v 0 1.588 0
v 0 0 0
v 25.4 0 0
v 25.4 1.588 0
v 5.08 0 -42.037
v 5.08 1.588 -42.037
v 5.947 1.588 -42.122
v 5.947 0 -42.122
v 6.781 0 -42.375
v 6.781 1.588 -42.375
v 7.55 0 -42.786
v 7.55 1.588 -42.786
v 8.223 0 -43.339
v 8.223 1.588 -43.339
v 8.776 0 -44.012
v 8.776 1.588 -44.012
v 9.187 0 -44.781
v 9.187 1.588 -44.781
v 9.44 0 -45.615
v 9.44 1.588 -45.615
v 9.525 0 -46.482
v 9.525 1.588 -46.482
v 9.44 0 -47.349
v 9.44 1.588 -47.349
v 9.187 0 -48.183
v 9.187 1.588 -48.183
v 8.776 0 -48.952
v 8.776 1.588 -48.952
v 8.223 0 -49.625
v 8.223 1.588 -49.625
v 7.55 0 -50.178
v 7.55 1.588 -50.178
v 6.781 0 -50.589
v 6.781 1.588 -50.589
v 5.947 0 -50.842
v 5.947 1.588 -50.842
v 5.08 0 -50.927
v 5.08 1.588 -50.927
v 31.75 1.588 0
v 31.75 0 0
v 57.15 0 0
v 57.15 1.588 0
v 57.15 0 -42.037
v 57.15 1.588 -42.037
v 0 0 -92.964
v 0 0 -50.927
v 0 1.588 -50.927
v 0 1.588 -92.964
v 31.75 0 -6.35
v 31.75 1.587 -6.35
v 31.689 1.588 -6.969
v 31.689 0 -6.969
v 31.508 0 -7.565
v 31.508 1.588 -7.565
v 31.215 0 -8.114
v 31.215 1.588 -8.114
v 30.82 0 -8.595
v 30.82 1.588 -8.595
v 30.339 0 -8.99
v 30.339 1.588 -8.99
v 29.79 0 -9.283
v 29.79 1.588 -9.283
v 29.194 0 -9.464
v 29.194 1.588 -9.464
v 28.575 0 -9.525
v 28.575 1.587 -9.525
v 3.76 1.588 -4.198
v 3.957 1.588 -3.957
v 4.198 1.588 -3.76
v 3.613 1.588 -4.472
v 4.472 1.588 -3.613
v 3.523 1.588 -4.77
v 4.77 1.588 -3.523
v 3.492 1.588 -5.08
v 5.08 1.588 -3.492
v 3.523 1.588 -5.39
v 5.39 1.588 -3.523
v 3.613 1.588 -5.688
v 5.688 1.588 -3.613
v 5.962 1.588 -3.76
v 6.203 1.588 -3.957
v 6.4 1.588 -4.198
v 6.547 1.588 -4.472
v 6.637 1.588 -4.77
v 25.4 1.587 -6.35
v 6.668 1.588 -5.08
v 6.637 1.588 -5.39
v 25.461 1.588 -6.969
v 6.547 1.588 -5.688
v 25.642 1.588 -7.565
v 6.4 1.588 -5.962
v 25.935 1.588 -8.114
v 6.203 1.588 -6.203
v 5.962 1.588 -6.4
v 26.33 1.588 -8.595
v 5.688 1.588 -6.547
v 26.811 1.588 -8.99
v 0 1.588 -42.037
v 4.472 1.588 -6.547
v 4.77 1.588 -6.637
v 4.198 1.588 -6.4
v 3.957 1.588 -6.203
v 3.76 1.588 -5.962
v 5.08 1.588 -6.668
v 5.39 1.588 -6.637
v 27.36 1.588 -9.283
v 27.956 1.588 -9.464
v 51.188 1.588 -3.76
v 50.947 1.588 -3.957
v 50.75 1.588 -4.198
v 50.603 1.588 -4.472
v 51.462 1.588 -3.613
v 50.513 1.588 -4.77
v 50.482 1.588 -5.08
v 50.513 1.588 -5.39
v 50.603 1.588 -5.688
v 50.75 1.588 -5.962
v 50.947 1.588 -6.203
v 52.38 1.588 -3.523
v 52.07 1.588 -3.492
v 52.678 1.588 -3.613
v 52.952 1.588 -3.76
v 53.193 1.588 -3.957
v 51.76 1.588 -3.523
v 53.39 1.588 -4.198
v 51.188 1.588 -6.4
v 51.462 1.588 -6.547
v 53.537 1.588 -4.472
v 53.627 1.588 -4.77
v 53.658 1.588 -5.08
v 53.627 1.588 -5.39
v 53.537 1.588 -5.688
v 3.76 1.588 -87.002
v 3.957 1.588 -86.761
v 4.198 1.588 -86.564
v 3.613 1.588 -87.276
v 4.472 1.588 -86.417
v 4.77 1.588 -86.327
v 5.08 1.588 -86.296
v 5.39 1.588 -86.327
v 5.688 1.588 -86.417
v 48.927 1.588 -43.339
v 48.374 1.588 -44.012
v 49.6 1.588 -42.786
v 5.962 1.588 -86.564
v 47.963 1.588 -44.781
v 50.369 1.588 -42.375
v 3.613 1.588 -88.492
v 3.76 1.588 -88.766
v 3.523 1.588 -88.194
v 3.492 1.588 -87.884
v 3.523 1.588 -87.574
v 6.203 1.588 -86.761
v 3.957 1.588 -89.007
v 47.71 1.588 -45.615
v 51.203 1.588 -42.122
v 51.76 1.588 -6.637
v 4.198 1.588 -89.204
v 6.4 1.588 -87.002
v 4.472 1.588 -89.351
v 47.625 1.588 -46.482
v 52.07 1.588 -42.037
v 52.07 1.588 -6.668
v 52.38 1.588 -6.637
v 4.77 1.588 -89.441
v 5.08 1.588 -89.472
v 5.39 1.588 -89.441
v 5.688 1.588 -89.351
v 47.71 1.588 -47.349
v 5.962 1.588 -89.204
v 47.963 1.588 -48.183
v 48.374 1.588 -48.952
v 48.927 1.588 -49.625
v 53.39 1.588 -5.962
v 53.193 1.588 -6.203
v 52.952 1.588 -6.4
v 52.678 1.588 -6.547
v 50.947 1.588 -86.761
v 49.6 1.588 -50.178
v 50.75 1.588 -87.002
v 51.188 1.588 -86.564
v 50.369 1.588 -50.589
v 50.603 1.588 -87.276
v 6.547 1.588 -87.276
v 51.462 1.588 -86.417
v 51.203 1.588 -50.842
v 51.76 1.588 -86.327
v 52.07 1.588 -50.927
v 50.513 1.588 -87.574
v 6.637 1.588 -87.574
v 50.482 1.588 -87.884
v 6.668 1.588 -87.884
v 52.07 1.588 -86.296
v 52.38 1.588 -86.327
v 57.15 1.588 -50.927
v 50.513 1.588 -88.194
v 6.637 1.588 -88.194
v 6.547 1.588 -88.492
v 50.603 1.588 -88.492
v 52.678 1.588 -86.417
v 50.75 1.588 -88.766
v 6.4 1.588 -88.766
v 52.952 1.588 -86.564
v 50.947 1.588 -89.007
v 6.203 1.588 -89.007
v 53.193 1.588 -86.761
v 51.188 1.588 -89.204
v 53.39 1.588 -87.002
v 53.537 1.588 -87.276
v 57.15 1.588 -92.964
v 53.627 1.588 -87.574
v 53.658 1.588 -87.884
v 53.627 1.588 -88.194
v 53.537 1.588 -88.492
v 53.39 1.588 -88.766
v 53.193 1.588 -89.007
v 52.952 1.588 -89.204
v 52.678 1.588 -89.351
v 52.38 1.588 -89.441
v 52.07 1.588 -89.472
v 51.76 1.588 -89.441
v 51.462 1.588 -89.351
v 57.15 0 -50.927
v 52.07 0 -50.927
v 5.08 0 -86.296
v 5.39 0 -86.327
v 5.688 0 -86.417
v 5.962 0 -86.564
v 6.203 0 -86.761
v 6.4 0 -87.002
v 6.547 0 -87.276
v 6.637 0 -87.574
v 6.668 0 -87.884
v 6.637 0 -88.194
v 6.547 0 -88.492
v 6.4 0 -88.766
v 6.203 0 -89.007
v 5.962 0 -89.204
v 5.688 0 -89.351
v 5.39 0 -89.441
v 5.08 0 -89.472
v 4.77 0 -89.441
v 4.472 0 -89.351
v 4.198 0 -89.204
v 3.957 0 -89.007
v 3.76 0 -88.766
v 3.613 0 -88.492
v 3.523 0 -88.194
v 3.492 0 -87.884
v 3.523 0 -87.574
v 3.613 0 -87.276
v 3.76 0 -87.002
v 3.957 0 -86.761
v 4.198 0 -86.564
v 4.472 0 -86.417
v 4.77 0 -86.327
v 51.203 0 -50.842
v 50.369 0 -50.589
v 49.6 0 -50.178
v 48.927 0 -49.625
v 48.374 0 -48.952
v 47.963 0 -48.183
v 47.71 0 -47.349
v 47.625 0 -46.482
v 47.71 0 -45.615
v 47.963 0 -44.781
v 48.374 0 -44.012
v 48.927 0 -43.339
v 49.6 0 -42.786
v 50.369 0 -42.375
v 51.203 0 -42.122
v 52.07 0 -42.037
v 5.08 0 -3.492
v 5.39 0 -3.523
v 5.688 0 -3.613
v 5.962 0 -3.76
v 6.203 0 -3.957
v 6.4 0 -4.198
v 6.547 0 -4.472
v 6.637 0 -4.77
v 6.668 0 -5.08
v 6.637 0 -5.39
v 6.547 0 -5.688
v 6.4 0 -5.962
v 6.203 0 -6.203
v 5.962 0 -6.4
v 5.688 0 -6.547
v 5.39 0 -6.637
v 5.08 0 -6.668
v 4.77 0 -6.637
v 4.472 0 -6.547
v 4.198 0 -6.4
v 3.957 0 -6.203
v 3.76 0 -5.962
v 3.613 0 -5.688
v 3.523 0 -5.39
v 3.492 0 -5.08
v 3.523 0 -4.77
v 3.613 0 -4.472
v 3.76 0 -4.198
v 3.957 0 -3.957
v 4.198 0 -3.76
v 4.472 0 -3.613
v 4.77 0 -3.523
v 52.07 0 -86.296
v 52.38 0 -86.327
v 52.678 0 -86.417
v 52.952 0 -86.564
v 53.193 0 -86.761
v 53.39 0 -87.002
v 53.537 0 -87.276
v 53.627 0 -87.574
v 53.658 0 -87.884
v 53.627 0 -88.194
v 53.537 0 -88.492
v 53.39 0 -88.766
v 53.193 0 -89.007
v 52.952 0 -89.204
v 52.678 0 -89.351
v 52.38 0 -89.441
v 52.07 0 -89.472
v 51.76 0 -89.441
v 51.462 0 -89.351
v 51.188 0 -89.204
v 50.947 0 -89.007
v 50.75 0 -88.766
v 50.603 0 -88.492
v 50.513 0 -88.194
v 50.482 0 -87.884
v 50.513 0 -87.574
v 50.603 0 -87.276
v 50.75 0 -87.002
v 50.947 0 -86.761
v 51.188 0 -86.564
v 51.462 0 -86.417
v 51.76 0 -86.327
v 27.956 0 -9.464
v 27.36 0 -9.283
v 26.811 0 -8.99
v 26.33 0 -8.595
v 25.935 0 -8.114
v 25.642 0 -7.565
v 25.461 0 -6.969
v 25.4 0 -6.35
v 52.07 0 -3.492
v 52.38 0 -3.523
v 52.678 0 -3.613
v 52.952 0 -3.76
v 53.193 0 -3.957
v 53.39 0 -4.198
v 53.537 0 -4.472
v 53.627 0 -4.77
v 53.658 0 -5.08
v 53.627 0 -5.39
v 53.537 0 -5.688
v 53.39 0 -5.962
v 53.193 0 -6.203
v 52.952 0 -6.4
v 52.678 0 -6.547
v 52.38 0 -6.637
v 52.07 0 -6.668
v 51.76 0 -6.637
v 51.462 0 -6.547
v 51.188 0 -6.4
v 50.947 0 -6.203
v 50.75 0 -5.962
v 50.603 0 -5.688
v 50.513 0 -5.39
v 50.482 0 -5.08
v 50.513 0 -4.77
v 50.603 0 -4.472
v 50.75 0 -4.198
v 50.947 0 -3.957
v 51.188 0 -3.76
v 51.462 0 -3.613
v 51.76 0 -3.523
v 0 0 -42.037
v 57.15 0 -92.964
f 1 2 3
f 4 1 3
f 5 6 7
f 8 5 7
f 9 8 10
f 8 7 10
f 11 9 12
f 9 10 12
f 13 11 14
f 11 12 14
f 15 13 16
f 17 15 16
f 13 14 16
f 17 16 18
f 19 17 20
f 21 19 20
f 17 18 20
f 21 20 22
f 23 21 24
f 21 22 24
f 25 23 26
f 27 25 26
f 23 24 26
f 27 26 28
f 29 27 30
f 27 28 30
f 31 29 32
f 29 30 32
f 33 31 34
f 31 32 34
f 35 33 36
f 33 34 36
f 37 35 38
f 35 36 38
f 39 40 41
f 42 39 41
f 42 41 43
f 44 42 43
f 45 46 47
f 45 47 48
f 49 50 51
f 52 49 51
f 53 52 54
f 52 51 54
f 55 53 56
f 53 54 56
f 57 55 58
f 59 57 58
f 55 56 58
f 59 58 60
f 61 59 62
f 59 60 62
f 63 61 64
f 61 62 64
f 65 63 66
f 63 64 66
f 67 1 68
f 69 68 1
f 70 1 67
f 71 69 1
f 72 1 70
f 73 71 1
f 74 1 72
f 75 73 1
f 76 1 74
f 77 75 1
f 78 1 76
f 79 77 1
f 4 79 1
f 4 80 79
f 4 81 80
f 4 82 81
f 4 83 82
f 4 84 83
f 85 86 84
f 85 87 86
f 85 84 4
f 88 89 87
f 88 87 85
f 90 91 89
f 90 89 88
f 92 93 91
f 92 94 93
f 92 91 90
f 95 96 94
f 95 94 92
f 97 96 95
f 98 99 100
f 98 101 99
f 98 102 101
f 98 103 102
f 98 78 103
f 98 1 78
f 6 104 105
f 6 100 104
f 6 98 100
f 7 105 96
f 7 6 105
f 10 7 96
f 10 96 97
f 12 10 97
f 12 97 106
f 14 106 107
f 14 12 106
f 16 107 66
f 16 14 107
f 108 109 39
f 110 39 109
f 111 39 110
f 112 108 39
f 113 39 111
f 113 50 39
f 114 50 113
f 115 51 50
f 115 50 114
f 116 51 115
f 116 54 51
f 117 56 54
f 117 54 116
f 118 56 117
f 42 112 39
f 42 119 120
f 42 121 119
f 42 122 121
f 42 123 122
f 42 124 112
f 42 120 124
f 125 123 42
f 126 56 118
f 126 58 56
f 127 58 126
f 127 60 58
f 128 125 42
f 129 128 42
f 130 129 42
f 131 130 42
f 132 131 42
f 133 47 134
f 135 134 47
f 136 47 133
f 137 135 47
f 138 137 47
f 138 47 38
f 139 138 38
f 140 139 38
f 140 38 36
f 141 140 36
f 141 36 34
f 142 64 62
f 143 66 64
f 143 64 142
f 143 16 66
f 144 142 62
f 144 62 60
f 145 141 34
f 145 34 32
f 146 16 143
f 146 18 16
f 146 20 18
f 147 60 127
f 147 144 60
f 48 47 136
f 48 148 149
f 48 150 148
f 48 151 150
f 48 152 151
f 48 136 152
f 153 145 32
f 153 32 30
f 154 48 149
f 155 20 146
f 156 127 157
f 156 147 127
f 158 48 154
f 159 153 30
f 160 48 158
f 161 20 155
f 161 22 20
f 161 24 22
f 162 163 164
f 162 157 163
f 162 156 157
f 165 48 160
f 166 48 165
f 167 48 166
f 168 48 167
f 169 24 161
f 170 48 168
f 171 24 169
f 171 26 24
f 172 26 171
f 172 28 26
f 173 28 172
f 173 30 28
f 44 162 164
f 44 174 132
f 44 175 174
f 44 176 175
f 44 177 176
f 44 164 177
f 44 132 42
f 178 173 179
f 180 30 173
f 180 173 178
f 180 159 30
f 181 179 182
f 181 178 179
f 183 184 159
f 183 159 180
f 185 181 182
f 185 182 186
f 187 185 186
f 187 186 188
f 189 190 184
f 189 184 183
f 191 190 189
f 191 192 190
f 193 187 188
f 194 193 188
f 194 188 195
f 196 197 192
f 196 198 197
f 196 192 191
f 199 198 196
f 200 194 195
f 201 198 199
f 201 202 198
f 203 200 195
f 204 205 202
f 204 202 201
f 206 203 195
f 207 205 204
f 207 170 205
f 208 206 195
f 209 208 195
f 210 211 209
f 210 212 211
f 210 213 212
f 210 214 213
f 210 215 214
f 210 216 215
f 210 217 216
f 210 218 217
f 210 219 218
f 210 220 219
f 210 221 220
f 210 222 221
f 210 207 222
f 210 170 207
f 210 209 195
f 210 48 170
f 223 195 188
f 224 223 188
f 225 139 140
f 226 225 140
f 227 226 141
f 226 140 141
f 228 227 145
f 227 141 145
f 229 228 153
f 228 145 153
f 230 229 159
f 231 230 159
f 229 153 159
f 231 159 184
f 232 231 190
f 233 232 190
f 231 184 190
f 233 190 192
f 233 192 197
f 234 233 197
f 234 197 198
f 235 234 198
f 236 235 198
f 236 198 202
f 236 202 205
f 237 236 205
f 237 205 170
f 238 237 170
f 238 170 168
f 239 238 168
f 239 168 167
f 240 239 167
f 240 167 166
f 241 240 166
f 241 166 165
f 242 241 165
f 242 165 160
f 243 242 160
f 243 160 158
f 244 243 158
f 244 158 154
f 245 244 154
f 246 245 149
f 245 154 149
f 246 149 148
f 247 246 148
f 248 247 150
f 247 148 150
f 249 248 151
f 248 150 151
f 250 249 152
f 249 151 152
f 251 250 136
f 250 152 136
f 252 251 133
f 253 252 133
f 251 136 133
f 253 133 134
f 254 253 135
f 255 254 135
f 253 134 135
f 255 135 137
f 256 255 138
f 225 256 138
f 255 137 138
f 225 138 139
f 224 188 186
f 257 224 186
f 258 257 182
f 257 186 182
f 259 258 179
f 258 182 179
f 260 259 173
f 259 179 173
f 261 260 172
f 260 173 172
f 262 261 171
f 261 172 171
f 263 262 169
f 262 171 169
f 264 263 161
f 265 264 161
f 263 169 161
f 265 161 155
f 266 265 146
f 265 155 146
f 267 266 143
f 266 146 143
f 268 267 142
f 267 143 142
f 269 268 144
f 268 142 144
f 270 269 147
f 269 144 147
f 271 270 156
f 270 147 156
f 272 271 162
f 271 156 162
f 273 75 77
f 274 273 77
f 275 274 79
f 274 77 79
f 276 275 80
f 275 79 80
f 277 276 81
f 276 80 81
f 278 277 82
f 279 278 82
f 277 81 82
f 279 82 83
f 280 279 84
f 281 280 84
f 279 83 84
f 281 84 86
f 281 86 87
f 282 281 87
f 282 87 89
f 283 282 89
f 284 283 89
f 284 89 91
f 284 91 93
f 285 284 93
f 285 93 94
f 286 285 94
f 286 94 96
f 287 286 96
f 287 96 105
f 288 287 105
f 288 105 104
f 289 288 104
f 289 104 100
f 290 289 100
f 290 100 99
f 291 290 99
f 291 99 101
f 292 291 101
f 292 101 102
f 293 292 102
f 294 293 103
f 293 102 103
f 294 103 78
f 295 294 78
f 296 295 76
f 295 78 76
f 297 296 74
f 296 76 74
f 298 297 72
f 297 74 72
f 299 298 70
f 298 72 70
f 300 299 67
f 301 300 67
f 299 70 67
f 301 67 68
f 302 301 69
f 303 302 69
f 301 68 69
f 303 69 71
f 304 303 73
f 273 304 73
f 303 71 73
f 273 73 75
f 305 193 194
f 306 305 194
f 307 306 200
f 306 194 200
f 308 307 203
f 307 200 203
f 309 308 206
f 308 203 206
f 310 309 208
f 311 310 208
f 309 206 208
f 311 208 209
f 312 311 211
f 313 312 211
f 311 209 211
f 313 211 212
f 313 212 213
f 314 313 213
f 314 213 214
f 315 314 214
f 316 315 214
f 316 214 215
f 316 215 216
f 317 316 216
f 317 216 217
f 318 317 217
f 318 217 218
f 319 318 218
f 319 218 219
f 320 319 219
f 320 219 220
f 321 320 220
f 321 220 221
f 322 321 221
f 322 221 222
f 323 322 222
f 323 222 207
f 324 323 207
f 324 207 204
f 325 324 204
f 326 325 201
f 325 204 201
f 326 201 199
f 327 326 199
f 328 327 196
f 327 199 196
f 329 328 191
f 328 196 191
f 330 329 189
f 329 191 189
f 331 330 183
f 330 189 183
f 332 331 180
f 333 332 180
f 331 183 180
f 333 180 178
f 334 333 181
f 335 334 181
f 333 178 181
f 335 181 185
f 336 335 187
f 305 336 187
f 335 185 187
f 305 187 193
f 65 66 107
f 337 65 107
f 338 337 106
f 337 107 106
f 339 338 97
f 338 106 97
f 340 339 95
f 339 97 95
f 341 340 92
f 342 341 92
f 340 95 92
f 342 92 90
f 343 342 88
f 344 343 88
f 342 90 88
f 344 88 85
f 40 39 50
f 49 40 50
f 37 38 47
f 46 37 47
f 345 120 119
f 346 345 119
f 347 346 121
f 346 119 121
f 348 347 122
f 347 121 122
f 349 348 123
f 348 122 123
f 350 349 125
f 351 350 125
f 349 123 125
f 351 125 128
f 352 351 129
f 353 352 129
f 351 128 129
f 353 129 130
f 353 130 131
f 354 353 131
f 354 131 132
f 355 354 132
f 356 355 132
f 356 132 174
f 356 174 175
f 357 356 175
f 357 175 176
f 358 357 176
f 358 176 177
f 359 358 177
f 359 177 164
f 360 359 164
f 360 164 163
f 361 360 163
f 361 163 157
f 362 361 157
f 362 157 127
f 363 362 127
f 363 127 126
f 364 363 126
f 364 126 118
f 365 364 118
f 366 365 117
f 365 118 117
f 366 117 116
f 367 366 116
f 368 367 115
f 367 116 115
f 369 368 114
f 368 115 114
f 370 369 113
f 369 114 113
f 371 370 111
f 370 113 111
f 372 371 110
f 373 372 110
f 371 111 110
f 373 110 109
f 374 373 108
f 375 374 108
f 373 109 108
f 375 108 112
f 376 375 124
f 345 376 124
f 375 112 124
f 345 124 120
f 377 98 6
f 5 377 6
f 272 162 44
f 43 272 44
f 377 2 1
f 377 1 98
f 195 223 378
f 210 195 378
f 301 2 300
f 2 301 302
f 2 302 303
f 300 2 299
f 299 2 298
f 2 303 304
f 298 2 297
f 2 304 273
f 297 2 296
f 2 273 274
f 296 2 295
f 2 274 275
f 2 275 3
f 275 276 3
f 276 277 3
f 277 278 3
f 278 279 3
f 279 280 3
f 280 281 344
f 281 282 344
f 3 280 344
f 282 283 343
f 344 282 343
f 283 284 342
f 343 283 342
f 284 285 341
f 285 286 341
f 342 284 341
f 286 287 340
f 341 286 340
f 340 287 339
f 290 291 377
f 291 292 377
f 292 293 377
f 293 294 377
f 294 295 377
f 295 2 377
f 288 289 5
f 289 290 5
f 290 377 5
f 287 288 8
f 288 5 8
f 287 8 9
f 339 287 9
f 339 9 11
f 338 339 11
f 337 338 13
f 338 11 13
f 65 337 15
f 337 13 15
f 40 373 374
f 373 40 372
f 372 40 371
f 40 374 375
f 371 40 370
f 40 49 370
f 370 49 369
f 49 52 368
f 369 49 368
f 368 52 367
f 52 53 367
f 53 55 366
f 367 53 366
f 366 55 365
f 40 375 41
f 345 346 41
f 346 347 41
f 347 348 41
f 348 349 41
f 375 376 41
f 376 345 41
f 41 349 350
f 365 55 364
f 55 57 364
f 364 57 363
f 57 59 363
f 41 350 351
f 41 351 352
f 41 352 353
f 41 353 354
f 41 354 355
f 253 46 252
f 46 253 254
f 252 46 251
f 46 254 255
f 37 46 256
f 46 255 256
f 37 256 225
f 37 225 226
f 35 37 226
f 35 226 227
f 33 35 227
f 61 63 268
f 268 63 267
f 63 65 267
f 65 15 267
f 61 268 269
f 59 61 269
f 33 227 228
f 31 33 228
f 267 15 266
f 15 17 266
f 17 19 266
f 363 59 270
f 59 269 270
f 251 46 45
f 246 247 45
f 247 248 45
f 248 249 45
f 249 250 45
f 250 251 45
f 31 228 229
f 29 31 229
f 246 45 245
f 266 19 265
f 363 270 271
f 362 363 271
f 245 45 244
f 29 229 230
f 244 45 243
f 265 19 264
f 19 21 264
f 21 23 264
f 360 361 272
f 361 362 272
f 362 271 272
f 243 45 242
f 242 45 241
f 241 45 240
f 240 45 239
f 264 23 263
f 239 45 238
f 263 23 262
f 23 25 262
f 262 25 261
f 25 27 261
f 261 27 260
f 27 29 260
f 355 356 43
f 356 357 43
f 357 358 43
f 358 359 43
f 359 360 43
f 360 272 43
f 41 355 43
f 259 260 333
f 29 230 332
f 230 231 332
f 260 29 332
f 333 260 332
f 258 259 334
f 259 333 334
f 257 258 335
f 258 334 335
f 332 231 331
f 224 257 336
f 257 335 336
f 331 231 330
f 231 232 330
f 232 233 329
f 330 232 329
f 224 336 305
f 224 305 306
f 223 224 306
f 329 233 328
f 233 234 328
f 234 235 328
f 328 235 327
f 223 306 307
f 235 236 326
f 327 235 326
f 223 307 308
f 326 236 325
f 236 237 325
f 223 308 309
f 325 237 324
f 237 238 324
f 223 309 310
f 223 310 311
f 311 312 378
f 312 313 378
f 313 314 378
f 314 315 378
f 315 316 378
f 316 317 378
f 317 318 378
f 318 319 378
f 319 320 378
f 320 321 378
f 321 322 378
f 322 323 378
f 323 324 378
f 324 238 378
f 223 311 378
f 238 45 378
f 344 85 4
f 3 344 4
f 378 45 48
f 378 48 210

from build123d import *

# Parameters (mm, degrees)
SKETCH1_W           = 57.15
SKETCH1_H           = 92.964
BOSS_EXTRUDE1_DEPTH = 1.5875
SKETCH2_R           = 1.5875
CUT_EXTRUDE1_DEPTH  = 110.137289467
SKETCH3_R           = 4.445
CUT_EXTRUDE2_DEPTH  = 110.137289467
CUT_EXTRUDE3_REACH  = 111.137


with BuildPart() as part:
    # Sketch1 → Boss-Extrude1 (new body)
    with BuildSketch(Plane(origin=(0, 0, 0), x_dir=(1, 0, 0), z_dir=(0, 1, 0))):
        with Locations((28.575, 46.482)):
            Rectangle(SKETCH1_W, SKETCH1_H)
    extrude(amount=BOSS_EXTRUDE1_DEPTH)

    # Sketch2 → Cut-Extrude1 (cut, through all)
    with BuildSketch(Plane(origin=(0, 1.5875, 0), x_dir=(1, 0, 0), z_dir=(0, 1, 0))):
        with Locations(Location((5.08, 87.884, 0), (0, 0, 270))):
            Circle(SKETCH2_R)
        with Locations(Location((52.07, 87.884, 0), (0, 0, 270))):
            Circle(SKETCH2_R)
        with Locations(Location((5.08, 5.08, 0), (0, 0, 270))):
            Circle(SKETCH2_R)
        with Locations(Location((52.07, 5.08, 0), (0, 0, 270))):
            Circle(SKETCH2_R)
    extrude(amount=-CUT_EXTRUDE1_DEPTH, mode=Mode.SUBTRACT)

    # Sketch3 → Cut-Extrude2 (cut, through all)
    with BuildSketch(Plane(origin=(0, 1.5875, 0), x_dir=(1, 0, 0), z_dir=(0, 1, 0))):
        with BuildLine():
            ThreePointArc((56.515, 46.482), (55.213089642, 43.338910358), (52.07, 42.037))
            Line((52.07, 42.037), (57.15, 42.037))
            Line((57.15, 42.037), (57.15, 50.927))
            Line((57.15, 50.927), (52.07, 50.927))
            ThreePointArc((52.07, 50.927), (55.213089642, 49.625089642), (56.515, 46.482))
        make_face()
        with Locations((52.07, 46.482)):
            Circle(SKETCH3_R)
        with Locations((5.08, 46.482)):
            Circle(SKETCH3_R)
        with BuildLine():
            Line((5.08, 50.927), (0, 50.927))
            Line((0, 50.927), (0, 42.037))
            Line((0, 42.037), (5.08, 42.037))
            ThreePointArc((5.08, 42.037), (0.635, 46.482), (5.08, 50.927))
        make_face()
    extrude(amount=-CUT_EXTRUDE2_DEPTH, mode=Mode.SUBTRACT)

    # Sketch4 → Cut-Extrude3 (cut, up to next)
    with BuildSketch(Plane(origin=(0, 1.5875, 0), x_dir=(1, 0, 0), z_dir=(0, 1, 0)), mode=Mode.PRIVATE) as cut_extrude3_sk1:
        with BuildLine():
            ThreePointArc((28.575, 3.175), (30.82006403, 4.10493597), (31.75, 6.35))
            ThreePointArc((31.75, 6.35), (30.82006403, 8.59506403), (28.575, 9.525))
            Line((28.575, 9.525), (28.575, 3.175))
        make_face()
    cut_extrude3_tool1 = extrude(cut_extrude3_sk1.sketch, amount=-CUT_EXTRUDE3_REACH, mode=Mode.PRIVATE) & part.part
    # Sketch4 → Cut-Extrude3 (cut, up to next)
    with BuildSketch(Plane(origin=(0, 1.5875, 0), x_dir=(1, 0, 0), z_dir=(0, 1, 0)), mode=Mode.PRIVATE) as cut_extrude3_sk2:
        with BuildLine():
            Line((28.575, 3.175), (28.575, 9.525))
            ThreePointArc((28.575, 9.525), (26.32993597, 8.59506403), (25.4, 6.35))
            ThreePointArc((25.4, 6.35), (26.32993597, 4.10493597), (28.575, 3.175))
        make_face()
    cut_extrude3_tool2 = extrude(cut_extrude3_sk2.sketch, amount=-CUT_EXTRUDE3_REACH, mode=Mode.PRIVATE) & part.part
    # Sketch4 → Cut-Extrude3 (cut, up to next)
    with BuildSketch(Plane(origin=(0, 1.5875, 0), x_dir=(1, 0, 0), z_dir=(0, 1, 0)), mode=Mode.PRIVATE) as cut_extrude3_sk3:
        with BuildLine():
            ThreePointArc((28.575, 3.175), (30.82006403, 4.10493597), (31.75, 6.35))
            ThreePointArc((31.75, 6.35), (30.82006403, 8.59506403), (28.575, 9.525))
            Line((28.575, 9.525), (28.575, 3.175))
        make_face()
    cut_extrude3_tool3 = extrude(cut_extrude3_sk3.sketch, amount=-CUT_EXTRUDE3_REACH, mode=Mode.PRIVATE) & part.part
    # Sketch4 → Cut-Extrude3 (cut, up to next)
    with BuildSketch(Plane(origin=(0, 1.5875, 0), x_dir=(1, 0, 0), z_dir=(0, 1, 0)), mode=Mode.PRIVATE) as cut_extrude3_sk4:
        with BuildLine():
            Line((28.575, 3.175), (28.575, 9.525))
            ThreePointArc((28.575, 9.525), (26.32993597, 8.59506403), (25.4, 6.35))
            ThreePointArc((25.4, 6.35), (26.32993597, 4.10493597), (28.575, 3.175))
        make_face()
    cut_extrude3_tool4 = extrude(cut_extrude3_sk4.sketch, amount=-CUT_EXTRUDE3_REACH, mode=Mode.PRIVATE) & part.part
    # Sketch4 → Cut-Extrude3 (cut, up to next)
    with BuildSketch(Plane(origin=(0, 1.5875, 0), x_dir=(1, 0, 0), z_dir=(0, 1, 0)), mode=Mode.PRIVATE) as cut_extrude3_sk5:
        with BuildLine():
            Line((28.575, 0), (28.575, 3.175))
            ThreePointArc((28.575, 3.175), (26.32993597, 4.10493597), (25.4, 6.35))
            Line((25.4, 6.35), (25.4, 0))
            Line((25.4, 0), (28.575, 0))
        make_face()
    cut_extrude3_tool5 = extrude(cut_extrude3_sk5.sketch, amount=-CUT_EXTRUDE3_REACH, mode=Mode.PRIVATE) & part.part
    # Sketch4 → Cut-Extrude3 (cut, up to next)
    with BuildSketch(Plane(origin=(0, 1.5875, 0), x_dir=(1, 0, 0), z_dir=(0, 1, 0)), mode=Mode.PRIVATE) as cut_extrude3_sk6:
        with BuildLine():
            Line((31.75, 0), (31.75, 6.35))
            ThreePointArc((31.75, 6.35), (30.82006403, 4.10493597), (28.575, 3.175))
            Line((28.575, 3.175), (28.575, 0))
            Line((28.575, 0), (31.75, 0))
        make_face()
    cut_extrude3_tool6 = extrude(cut_extrude3_sk6.sketch, amount=-CUT_EXTRUDE3_REACH, mode=Mode.PRIVATE) & part.part
    add(cut_extrude3_tool1.solids().sort_by_distance((29.922512, 1.5875, -6.35))[0], mode=Mode.SUBTRACT)
    add(cut_extrude3_tool2.solids().sort_by_distance((27.227488, 1.5875, -6.35))[0], mode=Mode.SUBTRACT)
    add(cut_extrude3_tool3.solids().sort_by_distance((29.922512, 1.5875, -6.35))[0], mode=Mode.SUBTRACT)
    add(cut_extrude3_tool4.solids().sort_by_distance((27.227488, 1.5875, -6.35))[0], mode=Mode.SUBTRACT)
    add(cut_extrude3_tool5.solids().sort_by_distance((26.832316, 1.5875, -1.993291))[0], mode=Mode.SUBTRACT)
    add(cut_extrude3_tool6.solids().sort_by_distance((30.317684, 1.5875, -1.993291))[0], mode=Mode.SUBTRACT)


solid = part.part
